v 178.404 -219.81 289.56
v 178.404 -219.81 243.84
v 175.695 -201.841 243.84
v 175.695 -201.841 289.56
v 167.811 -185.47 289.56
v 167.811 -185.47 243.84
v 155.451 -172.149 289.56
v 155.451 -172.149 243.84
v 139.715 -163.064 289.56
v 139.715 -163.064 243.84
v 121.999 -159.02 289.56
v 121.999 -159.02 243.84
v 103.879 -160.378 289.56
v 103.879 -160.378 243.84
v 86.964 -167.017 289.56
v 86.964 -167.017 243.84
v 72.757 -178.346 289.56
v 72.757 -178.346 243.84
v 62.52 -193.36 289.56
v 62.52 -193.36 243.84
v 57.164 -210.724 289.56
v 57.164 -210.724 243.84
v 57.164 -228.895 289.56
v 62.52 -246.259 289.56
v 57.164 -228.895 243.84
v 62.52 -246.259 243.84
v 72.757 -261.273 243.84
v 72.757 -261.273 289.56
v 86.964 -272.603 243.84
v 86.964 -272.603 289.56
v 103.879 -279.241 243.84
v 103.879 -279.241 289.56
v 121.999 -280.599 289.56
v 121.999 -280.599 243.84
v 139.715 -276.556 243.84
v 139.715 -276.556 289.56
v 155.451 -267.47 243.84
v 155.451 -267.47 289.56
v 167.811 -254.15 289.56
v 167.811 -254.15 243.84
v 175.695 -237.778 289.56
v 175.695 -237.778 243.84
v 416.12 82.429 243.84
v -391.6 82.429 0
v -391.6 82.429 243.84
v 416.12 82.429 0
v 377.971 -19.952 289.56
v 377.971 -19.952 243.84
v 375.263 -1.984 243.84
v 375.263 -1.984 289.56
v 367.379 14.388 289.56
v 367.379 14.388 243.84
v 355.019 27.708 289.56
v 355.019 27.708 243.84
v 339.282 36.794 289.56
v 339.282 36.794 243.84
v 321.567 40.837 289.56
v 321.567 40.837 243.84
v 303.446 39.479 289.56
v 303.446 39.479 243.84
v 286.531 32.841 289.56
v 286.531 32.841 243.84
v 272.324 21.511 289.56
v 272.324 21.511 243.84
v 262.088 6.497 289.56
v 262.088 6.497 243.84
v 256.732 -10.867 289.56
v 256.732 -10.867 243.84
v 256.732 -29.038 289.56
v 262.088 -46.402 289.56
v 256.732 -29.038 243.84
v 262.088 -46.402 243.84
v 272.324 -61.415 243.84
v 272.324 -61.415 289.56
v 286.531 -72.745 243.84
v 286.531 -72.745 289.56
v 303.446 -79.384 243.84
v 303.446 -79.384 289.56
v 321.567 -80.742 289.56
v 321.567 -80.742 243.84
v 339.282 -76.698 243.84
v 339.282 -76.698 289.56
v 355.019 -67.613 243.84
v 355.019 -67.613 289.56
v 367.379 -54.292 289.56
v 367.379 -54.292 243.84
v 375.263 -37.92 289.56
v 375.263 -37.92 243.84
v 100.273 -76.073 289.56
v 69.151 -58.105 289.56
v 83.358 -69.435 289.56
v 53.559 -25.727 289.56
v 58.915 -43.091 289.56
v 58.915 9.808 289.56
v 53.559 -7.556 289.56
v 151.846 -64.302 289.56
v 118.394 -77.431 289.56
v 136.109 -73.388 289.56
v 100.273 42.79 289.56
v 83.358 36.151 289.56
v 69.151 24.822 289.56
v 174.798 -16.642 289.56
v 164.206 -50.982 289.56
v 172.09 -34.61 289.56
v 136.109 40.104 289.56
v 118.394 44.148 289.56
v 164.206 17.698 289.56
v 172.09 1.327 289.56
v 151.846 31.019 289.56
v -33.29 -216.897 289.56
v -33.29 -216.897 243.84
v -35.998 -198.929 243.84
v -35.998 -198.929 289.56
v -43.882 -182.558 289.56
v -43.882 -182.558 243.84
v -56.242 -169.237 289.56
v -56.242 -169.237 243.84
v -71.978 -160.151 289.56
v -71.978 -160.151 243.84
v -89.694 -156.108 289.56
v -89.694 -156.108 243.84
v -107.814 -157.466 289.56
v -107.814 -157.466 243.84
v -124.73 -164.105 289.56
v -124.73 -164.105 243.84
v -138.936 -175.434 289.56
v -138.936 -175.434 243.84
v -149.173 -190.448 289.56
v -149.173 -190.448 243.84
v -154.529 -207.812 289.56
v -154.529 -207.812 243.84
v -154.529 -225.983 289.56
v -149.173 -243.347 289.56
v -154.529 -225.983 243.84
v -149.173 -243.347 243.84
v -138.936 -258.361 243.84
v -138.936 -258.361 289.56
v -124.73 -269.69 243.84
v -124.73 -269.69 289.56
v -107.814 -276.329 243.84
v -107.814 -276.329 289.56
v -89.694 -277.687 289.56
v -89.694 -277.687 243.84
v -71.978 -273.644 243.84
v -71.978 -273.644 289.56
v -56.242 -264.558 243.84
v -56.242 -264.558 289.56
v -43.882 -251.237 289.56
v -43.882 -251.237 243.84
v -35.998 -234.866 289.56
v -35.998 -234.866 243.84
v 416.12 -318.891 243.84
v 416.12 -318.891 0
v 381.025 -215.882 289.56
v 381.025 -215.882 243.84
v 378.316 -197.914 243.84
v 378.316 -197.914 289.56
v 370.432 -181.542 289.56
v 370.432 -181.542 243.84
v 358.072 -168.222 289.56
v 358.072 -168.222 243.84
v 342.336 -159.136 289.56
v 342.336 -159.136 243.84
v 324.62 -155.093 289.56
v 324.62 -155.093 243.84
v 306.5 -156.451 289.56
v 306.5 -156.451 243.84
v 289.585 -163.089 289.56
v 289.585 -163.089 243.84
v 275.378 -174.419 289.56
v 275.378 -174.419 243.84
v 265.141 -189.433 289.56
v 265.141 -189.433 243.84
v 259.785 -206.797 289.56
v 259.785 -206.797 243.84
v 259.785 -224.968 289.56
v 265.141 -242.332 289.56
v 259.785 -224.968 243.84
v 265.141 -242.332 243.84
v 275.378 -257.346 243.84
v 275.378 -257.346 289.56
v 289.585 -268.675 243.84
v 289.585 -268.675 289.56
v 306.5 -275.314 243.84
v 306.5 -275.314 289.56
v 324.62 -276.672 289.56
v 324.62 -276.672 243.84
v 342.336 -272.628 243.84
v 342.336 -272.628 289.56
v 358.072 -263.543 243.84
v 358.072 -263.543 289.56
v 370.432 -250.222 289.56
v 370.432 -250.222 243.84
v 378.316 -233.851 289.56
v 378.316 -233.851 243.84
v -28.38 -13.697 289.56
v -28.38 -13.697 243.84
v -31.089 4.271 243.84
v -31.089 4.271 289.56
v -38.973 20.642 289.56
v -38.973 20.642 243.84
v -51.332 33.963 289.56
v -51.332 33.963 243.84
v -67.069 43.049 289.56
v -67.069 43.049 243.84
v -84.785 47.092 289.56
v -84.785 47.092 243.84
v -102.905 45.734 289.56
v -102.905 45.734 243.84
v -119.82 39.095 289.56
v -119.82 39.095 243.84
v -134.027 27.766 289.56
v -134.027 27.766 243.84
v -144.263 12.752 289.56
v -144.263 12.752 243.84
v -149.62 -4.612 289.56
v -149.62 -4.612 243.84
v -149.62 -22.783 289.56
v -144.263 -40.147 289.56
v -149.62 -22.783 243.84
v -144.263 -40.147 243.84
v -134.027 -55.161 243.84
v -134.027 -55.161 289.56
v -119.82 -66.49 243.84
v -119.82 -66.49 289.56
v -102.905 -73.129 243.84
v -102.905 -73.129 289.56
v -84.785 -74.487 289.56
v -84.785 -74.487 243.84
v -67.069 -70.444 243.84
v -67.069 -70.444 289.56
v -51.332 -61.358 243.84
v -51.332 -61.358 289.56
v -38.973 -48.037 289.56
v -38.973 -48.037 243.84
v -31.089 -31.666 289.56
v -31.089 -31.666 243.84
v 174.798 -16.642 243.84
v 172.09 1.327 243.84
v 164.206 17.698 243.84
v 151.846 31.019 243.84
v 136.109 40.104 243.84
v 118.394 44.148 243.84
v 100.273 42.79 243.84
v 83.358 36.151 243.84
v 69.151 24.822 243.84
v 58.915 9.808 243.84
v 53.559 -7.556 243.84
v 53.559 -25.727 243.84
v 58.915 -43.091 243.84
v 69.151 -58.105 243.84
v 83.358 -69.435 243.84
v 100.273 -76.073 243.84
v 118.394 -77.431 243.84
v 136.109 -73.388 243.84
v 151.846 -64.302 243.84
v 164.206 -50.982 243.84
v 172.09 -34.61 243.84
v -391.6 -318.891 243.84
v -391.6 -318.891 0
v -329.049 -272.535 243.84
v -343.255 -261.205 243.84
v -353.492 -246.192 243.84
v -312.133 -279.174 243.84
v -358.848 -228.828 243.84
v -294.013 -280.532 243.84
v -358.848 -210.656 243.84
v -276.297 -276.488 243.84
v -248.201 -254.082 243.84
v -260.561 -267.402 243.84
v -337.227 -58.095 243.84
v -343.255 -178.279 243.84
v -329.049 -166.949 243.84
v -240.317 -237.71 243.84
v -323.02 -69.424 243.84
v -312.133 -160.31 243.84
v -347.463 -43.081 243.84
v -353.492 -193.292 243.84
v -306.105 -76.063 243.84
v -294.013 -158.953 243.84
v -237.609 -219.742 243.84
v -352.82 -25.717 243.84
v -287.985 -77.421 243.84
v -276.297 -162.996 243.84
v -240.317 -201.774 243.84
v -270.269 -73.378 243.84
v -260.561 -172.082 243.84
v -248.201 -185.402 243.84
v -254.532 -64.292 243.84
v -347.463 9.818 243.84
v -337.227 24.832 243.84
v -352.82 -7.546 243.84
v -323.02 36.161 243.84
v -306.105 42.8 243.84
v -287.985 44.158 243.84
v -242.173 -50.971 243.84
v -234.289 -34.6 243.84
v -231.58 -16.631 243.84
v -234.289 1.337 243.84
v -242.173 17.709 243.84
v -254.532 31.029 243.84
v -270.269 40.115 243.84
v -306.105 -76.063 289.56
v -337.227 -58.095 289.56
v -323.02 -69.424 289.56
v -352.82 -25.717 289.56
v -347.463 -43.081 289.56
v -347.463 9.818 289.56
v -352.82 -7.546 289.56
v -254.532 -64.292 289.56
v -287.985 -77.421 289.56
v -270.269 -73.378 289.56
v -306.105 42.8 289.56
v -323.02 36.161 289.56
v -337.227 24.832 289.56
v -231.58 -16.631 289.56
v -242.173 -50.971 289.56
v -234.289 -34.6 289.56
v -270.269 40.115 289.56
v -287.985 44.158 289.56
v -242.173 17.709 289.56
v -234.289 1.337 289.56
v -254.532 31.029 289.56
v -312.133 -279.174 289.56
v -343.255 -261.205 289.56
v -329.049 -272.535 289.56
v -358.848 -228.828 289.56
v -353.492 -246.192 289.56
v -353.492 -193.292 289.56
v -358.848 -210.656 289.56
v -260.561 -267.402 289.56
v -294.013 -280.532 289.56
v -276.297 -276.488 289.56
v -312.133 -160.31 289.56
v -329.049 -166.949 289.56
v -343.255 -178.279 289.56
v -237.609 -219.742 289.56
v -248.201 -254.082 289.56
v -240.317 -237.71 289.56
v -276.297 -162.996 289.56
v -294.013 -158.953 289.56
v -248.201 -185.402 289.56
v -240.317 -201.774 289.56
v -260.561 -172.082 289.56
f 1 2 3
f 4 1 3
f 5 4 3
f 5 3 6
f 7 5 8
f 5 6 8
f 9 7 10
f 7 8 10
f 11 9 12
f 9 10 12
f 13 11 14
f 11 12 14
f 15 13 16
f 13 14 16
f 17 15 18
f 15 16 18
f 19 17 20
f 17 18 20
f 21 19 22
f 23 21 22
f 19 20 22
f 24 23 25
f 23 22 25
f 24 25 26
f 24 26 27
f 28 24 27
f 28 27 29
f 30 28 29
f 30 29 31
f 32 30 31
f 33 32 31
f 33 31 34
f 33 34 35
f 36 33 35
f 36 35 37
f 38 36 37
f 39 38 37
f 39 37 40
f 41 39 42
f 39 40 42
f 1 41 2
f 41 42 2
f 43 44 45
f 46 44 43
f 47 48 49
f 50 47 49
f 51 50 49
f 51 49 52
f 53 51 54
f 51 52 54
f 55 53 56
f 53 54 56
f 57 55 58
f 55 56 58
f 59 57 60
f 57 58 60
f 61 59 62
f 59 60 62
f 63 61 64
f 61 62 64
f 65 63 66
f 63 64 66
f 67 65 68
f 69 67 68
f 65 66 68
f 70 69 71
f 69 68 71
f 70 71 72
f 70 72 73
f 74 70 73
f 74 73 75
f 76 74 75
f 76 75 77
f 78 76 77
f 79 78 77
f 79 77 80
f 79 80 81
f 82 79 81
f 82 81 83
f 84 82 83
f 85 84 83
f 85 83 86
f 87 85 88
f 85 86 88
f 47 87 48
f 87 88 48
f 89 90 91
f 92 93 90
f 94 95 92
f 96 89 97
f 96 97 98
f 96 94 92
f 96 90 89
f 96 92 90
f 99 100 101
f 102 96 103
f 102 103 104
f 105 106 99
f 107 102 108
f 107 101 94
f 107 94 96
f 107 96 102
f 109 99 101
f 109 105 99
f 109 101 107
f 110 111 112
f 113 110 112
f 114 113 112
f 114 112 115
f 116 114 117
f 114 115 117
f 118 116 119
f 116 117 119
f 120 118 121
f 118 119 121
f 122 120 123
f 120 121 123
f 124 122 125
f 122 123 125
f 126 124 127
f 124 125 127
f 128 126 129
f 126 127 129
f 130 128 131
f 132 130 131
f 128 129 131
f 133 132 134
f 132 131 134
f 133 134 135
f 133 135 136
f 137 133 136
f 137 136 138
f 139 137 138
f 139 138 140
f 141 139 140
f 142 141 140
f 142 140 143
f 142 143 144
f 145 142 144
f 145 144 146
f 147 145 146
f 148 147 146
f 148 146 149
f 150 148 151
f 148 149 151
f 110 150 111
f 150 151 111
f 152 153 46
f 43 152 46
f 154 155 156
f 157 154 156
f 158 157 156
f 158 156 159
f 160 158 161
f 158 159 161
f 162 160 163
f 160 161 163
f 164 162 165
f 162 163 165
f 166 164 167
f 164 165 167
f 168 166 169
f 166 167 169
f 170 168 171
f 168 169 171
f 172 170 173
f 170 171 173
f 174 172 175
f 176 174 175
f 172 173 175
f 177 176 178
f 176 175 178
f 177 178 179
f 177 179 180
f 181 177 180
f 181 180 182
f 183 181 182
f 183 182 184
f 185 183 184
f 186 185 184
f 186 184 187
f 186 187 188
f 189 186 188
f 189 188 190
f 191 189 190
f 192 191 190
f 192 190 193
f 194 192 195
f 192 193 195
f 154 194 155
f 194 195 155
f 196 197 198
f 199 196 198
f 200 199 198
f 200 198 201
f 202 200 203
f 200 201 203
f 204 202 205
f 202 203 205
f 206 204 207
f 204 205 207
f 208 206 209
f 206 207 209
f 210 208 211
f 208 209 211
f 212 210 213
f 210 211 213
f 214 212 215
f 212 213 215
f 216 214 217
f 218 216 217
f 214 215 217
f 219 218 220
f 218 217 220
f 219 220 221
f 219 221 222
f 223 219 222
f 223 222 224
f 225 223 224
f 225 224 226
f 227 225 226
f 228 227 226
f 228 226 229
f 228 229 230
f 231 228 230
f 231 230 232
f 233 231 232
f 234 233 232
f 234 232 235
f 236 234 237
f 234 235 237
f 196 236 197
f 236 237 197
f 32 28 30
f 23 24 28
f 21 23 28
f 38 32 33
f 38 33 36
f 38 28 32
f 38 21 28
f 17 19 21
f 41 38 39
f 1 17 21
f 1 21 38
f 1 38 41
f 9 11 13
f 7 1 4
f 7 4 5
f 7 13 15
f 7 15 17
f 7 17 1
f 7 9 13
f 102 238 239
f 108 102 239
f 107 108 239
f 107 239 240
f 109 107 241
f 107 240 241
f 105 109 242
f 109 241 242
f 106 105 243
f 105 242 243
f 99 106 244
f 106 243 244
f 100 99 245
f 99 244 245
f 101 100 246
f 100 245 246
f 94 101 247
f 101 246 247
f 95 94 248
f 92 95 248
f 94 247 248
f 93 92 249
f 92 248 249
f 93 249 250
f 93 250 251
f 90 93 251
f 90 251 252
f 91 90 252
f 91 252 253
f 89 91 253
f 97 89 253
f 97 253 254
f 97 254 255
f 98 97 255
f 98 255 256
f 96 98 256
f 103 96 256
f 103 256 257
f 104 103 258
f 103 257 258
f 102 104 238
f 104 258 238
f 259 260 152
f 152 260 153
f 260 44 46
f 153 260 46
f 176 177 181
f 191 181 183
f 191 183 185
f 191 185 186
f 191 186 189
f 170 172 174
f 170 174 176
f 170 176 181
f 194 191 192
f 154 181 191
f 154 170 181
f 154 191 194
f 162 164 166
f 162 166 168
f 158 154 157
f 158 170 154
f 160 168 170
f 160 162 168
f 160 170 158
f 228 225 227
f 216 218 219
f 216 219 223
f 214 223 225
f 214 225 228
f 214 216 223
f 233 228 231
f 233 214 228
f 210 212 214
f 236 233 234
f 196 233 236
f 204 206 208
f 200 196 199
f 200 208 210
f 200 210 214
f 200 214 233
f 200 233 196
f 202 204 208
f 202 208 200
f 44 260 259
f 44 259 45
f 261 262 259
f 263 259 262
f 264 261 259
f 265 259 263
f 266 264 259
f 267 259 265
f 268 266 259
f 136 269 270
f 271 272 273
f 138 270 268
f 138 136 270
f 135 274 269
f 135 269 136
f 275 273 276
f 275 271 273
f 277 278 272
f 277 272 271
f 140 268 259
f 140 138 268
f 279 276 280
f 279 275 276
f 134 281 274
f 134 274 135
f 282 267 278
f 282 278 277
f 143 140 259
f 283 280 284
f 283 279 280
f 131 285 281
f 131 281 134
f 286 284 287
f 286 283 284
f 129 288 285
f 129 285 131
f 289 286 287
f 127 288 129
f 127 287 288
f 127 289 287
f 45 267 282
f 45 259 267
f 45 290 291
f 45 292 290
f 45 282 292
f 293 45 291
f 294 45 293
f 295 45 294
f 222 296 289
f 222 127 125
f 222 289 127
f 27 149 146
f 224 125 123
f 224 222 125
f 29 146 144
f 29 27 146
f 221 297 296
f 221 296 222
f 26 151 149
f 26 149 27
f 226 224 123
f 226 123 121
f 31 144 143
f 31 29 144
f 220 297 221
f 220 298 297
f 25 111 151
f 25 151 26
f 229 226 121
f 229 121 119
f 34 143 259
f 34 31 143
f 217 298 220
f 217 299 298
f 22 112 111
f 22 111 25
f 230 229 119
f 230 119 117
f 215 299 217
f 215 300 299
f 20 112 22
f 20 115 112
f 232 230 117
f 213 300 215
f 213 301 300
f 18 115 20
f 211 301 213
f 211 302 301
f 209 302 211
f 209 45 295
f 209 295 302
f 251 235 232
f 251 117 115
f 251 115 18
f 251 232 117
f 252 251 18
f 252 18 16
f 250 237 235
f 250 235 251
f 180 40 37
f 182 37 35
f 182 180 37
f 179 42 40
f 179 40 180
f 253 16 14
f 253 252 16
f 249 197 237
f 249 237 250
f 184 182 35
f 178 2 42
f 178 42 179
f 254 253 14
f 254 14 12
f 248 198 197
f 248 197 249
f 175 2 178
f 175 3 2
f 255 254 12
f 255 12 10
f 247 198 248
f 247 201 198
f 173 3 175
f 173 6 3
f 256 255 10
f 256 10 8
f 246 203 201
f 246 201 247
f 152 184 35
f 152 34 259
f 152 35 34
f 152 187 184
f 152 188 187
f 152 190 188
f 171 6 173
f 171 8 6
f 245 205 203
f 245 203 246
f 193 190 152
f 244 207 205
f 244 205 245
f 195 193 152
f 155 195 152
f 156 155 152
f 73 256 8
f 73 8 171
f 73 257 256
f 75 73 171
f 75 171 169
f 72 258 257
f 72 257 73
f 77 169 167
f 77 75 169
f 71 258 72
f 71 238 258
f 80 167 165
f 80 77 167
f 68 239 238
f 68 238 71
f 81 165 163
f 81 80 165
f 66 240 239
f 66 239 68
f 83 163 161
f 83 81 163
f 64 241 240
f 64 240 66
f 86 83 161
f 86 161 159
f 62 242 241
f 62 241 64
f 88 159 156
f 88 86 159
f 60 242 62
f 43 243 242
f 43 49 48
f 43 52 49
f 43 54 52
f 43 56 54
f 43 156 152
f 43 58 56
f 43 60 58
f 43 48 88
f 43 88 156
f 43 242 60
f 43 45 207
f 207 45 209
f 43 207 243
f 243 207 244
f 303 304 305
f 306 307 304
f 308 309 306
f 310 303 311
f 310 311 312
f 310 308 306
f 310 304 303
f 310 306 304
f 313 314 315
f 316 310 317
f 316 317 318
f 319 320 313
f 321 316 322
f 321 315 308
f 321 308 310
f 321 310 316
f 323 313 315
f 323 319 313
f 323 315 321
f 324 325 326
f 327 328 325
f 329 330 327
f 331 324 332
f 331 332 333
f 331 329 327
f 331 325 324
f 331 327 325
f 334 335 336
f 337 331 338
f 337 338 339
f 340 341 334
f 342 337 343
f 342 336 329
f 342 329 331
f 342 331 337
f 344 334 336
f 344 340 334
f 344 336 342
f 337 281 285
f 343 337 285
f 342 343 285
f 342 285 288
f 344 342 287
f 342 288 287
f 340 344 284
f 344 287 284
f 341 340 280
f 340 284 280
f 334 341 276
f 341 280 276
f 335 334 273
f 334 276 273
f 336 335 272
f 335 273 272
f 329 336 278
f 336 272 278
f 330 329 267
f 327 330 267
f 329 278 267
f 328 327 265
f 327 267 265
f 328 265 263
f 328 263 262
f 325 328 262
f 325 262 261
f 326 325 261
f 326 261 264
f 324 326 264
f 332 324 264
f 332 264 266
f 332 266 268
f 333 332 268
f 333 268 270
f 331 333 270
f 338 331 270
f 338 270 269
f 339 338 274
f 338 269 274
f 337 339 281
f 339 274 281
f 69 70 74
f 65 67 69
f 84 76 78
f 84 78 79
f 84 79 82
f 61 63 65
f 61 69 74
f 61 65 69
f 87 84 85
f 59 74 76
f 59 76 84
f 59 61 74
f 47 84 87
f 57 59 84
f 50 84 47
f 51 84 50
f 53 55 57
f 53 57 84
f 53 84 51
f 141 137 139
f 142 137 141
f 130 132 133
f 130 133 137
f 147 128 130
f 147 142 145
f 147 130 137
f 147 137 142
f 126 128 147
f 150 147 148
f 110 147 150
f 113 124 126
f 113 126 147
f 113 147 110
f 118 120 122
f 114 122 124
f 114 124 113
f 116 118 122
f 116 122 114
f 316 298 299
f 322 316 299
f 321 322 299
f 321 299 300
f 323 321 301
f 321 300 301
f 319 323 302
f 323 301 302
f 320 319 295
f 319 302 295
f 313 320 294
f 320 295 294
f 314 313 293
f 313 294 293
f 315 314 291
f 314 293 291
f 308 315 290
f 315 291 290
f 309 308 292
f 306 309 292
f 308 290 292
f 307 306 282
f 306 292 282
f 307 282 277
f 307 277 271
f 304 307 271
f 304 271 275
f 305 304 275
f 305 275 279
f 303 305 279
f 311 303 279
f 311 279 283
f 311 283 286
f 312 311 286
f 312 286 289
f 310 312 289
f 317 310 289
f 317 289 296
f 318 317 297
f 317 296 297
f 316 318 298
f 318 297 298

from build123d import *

# Parameters (mm, degrees)
F0_W     = 807.72
F0_H     = 401.32
F1_DEPTH = 243.84
F2_R     = 60.96
F3_DEPTH = 45.72
F4_W     = 746.76
F4_H     = 340.36
F4_R     = 82.55
F4_R_2   = 60.96
F5_DEPTH = 45.72


with BuildPart() as f1:
    # F0 (on Top) → F1 (new body)
    with BuildSketch(Plane.XY):
        with Locations((12.259597, -118.231484)):
            Rectangle(F0_W, F0_H)
    extrude(amount=F1_DEPTH)

    # F2 (on face) → F3 (join)
    with BuildSketch(Plane.XY.offset(243.84)):
        with Locations((113.838267, -16.641684)):
            Circle(F2_R)
        with Locations((317.011298, -19.952157)):
            Circle(F2_R)
        with Locations((-298.568574, -219.742048)):
            Circle(F2_R)
        with Locations((-94.249569, -216.897499)):
            Circle(F2_R)
        with Locations((117.443508, -219.809698)):
            Circle(F2_R)
        with Locations((320.064545, -215.882391)):
            Circle(F2_R)
        with Locations((-89.340403, -13.697499)):
            Circle(F2_R)
        with Locations((-292.540403, -16.631484)):
            Circle(F2_R)
    extrude(amount=F3_DEPTH)

    # F4 (on Top) → F5 (join)
    with BuildSketch(Plane.XY):
        with Locations((12.259597, -118.231484)):
            Rectangle(F4_W, F4_H)
        with Locations((-208.453938, -102.044091)):
            Circle(F4_R, mode=Mode.SUBTRACT)
        with Locations((27.986567, -95.26559)):
            Circle(F4_R, mode=Mode.SUBTRACT)
        with Locations((240.385324, -99.75633)):
            Circle(F4_R, mode=Mode.SUBTRACT)
        with Locations((-208.453938, -102.044091)):
            Circle(F4_R_2)
        with Locations((27.986567, -95.26559)):
            Circle(F4_R_2)
        with Locations((240.385324, -99.75633)):
            Circle(F4_R_2)
    extrude(amount=F5_DEPTH)


solid = f1.part
